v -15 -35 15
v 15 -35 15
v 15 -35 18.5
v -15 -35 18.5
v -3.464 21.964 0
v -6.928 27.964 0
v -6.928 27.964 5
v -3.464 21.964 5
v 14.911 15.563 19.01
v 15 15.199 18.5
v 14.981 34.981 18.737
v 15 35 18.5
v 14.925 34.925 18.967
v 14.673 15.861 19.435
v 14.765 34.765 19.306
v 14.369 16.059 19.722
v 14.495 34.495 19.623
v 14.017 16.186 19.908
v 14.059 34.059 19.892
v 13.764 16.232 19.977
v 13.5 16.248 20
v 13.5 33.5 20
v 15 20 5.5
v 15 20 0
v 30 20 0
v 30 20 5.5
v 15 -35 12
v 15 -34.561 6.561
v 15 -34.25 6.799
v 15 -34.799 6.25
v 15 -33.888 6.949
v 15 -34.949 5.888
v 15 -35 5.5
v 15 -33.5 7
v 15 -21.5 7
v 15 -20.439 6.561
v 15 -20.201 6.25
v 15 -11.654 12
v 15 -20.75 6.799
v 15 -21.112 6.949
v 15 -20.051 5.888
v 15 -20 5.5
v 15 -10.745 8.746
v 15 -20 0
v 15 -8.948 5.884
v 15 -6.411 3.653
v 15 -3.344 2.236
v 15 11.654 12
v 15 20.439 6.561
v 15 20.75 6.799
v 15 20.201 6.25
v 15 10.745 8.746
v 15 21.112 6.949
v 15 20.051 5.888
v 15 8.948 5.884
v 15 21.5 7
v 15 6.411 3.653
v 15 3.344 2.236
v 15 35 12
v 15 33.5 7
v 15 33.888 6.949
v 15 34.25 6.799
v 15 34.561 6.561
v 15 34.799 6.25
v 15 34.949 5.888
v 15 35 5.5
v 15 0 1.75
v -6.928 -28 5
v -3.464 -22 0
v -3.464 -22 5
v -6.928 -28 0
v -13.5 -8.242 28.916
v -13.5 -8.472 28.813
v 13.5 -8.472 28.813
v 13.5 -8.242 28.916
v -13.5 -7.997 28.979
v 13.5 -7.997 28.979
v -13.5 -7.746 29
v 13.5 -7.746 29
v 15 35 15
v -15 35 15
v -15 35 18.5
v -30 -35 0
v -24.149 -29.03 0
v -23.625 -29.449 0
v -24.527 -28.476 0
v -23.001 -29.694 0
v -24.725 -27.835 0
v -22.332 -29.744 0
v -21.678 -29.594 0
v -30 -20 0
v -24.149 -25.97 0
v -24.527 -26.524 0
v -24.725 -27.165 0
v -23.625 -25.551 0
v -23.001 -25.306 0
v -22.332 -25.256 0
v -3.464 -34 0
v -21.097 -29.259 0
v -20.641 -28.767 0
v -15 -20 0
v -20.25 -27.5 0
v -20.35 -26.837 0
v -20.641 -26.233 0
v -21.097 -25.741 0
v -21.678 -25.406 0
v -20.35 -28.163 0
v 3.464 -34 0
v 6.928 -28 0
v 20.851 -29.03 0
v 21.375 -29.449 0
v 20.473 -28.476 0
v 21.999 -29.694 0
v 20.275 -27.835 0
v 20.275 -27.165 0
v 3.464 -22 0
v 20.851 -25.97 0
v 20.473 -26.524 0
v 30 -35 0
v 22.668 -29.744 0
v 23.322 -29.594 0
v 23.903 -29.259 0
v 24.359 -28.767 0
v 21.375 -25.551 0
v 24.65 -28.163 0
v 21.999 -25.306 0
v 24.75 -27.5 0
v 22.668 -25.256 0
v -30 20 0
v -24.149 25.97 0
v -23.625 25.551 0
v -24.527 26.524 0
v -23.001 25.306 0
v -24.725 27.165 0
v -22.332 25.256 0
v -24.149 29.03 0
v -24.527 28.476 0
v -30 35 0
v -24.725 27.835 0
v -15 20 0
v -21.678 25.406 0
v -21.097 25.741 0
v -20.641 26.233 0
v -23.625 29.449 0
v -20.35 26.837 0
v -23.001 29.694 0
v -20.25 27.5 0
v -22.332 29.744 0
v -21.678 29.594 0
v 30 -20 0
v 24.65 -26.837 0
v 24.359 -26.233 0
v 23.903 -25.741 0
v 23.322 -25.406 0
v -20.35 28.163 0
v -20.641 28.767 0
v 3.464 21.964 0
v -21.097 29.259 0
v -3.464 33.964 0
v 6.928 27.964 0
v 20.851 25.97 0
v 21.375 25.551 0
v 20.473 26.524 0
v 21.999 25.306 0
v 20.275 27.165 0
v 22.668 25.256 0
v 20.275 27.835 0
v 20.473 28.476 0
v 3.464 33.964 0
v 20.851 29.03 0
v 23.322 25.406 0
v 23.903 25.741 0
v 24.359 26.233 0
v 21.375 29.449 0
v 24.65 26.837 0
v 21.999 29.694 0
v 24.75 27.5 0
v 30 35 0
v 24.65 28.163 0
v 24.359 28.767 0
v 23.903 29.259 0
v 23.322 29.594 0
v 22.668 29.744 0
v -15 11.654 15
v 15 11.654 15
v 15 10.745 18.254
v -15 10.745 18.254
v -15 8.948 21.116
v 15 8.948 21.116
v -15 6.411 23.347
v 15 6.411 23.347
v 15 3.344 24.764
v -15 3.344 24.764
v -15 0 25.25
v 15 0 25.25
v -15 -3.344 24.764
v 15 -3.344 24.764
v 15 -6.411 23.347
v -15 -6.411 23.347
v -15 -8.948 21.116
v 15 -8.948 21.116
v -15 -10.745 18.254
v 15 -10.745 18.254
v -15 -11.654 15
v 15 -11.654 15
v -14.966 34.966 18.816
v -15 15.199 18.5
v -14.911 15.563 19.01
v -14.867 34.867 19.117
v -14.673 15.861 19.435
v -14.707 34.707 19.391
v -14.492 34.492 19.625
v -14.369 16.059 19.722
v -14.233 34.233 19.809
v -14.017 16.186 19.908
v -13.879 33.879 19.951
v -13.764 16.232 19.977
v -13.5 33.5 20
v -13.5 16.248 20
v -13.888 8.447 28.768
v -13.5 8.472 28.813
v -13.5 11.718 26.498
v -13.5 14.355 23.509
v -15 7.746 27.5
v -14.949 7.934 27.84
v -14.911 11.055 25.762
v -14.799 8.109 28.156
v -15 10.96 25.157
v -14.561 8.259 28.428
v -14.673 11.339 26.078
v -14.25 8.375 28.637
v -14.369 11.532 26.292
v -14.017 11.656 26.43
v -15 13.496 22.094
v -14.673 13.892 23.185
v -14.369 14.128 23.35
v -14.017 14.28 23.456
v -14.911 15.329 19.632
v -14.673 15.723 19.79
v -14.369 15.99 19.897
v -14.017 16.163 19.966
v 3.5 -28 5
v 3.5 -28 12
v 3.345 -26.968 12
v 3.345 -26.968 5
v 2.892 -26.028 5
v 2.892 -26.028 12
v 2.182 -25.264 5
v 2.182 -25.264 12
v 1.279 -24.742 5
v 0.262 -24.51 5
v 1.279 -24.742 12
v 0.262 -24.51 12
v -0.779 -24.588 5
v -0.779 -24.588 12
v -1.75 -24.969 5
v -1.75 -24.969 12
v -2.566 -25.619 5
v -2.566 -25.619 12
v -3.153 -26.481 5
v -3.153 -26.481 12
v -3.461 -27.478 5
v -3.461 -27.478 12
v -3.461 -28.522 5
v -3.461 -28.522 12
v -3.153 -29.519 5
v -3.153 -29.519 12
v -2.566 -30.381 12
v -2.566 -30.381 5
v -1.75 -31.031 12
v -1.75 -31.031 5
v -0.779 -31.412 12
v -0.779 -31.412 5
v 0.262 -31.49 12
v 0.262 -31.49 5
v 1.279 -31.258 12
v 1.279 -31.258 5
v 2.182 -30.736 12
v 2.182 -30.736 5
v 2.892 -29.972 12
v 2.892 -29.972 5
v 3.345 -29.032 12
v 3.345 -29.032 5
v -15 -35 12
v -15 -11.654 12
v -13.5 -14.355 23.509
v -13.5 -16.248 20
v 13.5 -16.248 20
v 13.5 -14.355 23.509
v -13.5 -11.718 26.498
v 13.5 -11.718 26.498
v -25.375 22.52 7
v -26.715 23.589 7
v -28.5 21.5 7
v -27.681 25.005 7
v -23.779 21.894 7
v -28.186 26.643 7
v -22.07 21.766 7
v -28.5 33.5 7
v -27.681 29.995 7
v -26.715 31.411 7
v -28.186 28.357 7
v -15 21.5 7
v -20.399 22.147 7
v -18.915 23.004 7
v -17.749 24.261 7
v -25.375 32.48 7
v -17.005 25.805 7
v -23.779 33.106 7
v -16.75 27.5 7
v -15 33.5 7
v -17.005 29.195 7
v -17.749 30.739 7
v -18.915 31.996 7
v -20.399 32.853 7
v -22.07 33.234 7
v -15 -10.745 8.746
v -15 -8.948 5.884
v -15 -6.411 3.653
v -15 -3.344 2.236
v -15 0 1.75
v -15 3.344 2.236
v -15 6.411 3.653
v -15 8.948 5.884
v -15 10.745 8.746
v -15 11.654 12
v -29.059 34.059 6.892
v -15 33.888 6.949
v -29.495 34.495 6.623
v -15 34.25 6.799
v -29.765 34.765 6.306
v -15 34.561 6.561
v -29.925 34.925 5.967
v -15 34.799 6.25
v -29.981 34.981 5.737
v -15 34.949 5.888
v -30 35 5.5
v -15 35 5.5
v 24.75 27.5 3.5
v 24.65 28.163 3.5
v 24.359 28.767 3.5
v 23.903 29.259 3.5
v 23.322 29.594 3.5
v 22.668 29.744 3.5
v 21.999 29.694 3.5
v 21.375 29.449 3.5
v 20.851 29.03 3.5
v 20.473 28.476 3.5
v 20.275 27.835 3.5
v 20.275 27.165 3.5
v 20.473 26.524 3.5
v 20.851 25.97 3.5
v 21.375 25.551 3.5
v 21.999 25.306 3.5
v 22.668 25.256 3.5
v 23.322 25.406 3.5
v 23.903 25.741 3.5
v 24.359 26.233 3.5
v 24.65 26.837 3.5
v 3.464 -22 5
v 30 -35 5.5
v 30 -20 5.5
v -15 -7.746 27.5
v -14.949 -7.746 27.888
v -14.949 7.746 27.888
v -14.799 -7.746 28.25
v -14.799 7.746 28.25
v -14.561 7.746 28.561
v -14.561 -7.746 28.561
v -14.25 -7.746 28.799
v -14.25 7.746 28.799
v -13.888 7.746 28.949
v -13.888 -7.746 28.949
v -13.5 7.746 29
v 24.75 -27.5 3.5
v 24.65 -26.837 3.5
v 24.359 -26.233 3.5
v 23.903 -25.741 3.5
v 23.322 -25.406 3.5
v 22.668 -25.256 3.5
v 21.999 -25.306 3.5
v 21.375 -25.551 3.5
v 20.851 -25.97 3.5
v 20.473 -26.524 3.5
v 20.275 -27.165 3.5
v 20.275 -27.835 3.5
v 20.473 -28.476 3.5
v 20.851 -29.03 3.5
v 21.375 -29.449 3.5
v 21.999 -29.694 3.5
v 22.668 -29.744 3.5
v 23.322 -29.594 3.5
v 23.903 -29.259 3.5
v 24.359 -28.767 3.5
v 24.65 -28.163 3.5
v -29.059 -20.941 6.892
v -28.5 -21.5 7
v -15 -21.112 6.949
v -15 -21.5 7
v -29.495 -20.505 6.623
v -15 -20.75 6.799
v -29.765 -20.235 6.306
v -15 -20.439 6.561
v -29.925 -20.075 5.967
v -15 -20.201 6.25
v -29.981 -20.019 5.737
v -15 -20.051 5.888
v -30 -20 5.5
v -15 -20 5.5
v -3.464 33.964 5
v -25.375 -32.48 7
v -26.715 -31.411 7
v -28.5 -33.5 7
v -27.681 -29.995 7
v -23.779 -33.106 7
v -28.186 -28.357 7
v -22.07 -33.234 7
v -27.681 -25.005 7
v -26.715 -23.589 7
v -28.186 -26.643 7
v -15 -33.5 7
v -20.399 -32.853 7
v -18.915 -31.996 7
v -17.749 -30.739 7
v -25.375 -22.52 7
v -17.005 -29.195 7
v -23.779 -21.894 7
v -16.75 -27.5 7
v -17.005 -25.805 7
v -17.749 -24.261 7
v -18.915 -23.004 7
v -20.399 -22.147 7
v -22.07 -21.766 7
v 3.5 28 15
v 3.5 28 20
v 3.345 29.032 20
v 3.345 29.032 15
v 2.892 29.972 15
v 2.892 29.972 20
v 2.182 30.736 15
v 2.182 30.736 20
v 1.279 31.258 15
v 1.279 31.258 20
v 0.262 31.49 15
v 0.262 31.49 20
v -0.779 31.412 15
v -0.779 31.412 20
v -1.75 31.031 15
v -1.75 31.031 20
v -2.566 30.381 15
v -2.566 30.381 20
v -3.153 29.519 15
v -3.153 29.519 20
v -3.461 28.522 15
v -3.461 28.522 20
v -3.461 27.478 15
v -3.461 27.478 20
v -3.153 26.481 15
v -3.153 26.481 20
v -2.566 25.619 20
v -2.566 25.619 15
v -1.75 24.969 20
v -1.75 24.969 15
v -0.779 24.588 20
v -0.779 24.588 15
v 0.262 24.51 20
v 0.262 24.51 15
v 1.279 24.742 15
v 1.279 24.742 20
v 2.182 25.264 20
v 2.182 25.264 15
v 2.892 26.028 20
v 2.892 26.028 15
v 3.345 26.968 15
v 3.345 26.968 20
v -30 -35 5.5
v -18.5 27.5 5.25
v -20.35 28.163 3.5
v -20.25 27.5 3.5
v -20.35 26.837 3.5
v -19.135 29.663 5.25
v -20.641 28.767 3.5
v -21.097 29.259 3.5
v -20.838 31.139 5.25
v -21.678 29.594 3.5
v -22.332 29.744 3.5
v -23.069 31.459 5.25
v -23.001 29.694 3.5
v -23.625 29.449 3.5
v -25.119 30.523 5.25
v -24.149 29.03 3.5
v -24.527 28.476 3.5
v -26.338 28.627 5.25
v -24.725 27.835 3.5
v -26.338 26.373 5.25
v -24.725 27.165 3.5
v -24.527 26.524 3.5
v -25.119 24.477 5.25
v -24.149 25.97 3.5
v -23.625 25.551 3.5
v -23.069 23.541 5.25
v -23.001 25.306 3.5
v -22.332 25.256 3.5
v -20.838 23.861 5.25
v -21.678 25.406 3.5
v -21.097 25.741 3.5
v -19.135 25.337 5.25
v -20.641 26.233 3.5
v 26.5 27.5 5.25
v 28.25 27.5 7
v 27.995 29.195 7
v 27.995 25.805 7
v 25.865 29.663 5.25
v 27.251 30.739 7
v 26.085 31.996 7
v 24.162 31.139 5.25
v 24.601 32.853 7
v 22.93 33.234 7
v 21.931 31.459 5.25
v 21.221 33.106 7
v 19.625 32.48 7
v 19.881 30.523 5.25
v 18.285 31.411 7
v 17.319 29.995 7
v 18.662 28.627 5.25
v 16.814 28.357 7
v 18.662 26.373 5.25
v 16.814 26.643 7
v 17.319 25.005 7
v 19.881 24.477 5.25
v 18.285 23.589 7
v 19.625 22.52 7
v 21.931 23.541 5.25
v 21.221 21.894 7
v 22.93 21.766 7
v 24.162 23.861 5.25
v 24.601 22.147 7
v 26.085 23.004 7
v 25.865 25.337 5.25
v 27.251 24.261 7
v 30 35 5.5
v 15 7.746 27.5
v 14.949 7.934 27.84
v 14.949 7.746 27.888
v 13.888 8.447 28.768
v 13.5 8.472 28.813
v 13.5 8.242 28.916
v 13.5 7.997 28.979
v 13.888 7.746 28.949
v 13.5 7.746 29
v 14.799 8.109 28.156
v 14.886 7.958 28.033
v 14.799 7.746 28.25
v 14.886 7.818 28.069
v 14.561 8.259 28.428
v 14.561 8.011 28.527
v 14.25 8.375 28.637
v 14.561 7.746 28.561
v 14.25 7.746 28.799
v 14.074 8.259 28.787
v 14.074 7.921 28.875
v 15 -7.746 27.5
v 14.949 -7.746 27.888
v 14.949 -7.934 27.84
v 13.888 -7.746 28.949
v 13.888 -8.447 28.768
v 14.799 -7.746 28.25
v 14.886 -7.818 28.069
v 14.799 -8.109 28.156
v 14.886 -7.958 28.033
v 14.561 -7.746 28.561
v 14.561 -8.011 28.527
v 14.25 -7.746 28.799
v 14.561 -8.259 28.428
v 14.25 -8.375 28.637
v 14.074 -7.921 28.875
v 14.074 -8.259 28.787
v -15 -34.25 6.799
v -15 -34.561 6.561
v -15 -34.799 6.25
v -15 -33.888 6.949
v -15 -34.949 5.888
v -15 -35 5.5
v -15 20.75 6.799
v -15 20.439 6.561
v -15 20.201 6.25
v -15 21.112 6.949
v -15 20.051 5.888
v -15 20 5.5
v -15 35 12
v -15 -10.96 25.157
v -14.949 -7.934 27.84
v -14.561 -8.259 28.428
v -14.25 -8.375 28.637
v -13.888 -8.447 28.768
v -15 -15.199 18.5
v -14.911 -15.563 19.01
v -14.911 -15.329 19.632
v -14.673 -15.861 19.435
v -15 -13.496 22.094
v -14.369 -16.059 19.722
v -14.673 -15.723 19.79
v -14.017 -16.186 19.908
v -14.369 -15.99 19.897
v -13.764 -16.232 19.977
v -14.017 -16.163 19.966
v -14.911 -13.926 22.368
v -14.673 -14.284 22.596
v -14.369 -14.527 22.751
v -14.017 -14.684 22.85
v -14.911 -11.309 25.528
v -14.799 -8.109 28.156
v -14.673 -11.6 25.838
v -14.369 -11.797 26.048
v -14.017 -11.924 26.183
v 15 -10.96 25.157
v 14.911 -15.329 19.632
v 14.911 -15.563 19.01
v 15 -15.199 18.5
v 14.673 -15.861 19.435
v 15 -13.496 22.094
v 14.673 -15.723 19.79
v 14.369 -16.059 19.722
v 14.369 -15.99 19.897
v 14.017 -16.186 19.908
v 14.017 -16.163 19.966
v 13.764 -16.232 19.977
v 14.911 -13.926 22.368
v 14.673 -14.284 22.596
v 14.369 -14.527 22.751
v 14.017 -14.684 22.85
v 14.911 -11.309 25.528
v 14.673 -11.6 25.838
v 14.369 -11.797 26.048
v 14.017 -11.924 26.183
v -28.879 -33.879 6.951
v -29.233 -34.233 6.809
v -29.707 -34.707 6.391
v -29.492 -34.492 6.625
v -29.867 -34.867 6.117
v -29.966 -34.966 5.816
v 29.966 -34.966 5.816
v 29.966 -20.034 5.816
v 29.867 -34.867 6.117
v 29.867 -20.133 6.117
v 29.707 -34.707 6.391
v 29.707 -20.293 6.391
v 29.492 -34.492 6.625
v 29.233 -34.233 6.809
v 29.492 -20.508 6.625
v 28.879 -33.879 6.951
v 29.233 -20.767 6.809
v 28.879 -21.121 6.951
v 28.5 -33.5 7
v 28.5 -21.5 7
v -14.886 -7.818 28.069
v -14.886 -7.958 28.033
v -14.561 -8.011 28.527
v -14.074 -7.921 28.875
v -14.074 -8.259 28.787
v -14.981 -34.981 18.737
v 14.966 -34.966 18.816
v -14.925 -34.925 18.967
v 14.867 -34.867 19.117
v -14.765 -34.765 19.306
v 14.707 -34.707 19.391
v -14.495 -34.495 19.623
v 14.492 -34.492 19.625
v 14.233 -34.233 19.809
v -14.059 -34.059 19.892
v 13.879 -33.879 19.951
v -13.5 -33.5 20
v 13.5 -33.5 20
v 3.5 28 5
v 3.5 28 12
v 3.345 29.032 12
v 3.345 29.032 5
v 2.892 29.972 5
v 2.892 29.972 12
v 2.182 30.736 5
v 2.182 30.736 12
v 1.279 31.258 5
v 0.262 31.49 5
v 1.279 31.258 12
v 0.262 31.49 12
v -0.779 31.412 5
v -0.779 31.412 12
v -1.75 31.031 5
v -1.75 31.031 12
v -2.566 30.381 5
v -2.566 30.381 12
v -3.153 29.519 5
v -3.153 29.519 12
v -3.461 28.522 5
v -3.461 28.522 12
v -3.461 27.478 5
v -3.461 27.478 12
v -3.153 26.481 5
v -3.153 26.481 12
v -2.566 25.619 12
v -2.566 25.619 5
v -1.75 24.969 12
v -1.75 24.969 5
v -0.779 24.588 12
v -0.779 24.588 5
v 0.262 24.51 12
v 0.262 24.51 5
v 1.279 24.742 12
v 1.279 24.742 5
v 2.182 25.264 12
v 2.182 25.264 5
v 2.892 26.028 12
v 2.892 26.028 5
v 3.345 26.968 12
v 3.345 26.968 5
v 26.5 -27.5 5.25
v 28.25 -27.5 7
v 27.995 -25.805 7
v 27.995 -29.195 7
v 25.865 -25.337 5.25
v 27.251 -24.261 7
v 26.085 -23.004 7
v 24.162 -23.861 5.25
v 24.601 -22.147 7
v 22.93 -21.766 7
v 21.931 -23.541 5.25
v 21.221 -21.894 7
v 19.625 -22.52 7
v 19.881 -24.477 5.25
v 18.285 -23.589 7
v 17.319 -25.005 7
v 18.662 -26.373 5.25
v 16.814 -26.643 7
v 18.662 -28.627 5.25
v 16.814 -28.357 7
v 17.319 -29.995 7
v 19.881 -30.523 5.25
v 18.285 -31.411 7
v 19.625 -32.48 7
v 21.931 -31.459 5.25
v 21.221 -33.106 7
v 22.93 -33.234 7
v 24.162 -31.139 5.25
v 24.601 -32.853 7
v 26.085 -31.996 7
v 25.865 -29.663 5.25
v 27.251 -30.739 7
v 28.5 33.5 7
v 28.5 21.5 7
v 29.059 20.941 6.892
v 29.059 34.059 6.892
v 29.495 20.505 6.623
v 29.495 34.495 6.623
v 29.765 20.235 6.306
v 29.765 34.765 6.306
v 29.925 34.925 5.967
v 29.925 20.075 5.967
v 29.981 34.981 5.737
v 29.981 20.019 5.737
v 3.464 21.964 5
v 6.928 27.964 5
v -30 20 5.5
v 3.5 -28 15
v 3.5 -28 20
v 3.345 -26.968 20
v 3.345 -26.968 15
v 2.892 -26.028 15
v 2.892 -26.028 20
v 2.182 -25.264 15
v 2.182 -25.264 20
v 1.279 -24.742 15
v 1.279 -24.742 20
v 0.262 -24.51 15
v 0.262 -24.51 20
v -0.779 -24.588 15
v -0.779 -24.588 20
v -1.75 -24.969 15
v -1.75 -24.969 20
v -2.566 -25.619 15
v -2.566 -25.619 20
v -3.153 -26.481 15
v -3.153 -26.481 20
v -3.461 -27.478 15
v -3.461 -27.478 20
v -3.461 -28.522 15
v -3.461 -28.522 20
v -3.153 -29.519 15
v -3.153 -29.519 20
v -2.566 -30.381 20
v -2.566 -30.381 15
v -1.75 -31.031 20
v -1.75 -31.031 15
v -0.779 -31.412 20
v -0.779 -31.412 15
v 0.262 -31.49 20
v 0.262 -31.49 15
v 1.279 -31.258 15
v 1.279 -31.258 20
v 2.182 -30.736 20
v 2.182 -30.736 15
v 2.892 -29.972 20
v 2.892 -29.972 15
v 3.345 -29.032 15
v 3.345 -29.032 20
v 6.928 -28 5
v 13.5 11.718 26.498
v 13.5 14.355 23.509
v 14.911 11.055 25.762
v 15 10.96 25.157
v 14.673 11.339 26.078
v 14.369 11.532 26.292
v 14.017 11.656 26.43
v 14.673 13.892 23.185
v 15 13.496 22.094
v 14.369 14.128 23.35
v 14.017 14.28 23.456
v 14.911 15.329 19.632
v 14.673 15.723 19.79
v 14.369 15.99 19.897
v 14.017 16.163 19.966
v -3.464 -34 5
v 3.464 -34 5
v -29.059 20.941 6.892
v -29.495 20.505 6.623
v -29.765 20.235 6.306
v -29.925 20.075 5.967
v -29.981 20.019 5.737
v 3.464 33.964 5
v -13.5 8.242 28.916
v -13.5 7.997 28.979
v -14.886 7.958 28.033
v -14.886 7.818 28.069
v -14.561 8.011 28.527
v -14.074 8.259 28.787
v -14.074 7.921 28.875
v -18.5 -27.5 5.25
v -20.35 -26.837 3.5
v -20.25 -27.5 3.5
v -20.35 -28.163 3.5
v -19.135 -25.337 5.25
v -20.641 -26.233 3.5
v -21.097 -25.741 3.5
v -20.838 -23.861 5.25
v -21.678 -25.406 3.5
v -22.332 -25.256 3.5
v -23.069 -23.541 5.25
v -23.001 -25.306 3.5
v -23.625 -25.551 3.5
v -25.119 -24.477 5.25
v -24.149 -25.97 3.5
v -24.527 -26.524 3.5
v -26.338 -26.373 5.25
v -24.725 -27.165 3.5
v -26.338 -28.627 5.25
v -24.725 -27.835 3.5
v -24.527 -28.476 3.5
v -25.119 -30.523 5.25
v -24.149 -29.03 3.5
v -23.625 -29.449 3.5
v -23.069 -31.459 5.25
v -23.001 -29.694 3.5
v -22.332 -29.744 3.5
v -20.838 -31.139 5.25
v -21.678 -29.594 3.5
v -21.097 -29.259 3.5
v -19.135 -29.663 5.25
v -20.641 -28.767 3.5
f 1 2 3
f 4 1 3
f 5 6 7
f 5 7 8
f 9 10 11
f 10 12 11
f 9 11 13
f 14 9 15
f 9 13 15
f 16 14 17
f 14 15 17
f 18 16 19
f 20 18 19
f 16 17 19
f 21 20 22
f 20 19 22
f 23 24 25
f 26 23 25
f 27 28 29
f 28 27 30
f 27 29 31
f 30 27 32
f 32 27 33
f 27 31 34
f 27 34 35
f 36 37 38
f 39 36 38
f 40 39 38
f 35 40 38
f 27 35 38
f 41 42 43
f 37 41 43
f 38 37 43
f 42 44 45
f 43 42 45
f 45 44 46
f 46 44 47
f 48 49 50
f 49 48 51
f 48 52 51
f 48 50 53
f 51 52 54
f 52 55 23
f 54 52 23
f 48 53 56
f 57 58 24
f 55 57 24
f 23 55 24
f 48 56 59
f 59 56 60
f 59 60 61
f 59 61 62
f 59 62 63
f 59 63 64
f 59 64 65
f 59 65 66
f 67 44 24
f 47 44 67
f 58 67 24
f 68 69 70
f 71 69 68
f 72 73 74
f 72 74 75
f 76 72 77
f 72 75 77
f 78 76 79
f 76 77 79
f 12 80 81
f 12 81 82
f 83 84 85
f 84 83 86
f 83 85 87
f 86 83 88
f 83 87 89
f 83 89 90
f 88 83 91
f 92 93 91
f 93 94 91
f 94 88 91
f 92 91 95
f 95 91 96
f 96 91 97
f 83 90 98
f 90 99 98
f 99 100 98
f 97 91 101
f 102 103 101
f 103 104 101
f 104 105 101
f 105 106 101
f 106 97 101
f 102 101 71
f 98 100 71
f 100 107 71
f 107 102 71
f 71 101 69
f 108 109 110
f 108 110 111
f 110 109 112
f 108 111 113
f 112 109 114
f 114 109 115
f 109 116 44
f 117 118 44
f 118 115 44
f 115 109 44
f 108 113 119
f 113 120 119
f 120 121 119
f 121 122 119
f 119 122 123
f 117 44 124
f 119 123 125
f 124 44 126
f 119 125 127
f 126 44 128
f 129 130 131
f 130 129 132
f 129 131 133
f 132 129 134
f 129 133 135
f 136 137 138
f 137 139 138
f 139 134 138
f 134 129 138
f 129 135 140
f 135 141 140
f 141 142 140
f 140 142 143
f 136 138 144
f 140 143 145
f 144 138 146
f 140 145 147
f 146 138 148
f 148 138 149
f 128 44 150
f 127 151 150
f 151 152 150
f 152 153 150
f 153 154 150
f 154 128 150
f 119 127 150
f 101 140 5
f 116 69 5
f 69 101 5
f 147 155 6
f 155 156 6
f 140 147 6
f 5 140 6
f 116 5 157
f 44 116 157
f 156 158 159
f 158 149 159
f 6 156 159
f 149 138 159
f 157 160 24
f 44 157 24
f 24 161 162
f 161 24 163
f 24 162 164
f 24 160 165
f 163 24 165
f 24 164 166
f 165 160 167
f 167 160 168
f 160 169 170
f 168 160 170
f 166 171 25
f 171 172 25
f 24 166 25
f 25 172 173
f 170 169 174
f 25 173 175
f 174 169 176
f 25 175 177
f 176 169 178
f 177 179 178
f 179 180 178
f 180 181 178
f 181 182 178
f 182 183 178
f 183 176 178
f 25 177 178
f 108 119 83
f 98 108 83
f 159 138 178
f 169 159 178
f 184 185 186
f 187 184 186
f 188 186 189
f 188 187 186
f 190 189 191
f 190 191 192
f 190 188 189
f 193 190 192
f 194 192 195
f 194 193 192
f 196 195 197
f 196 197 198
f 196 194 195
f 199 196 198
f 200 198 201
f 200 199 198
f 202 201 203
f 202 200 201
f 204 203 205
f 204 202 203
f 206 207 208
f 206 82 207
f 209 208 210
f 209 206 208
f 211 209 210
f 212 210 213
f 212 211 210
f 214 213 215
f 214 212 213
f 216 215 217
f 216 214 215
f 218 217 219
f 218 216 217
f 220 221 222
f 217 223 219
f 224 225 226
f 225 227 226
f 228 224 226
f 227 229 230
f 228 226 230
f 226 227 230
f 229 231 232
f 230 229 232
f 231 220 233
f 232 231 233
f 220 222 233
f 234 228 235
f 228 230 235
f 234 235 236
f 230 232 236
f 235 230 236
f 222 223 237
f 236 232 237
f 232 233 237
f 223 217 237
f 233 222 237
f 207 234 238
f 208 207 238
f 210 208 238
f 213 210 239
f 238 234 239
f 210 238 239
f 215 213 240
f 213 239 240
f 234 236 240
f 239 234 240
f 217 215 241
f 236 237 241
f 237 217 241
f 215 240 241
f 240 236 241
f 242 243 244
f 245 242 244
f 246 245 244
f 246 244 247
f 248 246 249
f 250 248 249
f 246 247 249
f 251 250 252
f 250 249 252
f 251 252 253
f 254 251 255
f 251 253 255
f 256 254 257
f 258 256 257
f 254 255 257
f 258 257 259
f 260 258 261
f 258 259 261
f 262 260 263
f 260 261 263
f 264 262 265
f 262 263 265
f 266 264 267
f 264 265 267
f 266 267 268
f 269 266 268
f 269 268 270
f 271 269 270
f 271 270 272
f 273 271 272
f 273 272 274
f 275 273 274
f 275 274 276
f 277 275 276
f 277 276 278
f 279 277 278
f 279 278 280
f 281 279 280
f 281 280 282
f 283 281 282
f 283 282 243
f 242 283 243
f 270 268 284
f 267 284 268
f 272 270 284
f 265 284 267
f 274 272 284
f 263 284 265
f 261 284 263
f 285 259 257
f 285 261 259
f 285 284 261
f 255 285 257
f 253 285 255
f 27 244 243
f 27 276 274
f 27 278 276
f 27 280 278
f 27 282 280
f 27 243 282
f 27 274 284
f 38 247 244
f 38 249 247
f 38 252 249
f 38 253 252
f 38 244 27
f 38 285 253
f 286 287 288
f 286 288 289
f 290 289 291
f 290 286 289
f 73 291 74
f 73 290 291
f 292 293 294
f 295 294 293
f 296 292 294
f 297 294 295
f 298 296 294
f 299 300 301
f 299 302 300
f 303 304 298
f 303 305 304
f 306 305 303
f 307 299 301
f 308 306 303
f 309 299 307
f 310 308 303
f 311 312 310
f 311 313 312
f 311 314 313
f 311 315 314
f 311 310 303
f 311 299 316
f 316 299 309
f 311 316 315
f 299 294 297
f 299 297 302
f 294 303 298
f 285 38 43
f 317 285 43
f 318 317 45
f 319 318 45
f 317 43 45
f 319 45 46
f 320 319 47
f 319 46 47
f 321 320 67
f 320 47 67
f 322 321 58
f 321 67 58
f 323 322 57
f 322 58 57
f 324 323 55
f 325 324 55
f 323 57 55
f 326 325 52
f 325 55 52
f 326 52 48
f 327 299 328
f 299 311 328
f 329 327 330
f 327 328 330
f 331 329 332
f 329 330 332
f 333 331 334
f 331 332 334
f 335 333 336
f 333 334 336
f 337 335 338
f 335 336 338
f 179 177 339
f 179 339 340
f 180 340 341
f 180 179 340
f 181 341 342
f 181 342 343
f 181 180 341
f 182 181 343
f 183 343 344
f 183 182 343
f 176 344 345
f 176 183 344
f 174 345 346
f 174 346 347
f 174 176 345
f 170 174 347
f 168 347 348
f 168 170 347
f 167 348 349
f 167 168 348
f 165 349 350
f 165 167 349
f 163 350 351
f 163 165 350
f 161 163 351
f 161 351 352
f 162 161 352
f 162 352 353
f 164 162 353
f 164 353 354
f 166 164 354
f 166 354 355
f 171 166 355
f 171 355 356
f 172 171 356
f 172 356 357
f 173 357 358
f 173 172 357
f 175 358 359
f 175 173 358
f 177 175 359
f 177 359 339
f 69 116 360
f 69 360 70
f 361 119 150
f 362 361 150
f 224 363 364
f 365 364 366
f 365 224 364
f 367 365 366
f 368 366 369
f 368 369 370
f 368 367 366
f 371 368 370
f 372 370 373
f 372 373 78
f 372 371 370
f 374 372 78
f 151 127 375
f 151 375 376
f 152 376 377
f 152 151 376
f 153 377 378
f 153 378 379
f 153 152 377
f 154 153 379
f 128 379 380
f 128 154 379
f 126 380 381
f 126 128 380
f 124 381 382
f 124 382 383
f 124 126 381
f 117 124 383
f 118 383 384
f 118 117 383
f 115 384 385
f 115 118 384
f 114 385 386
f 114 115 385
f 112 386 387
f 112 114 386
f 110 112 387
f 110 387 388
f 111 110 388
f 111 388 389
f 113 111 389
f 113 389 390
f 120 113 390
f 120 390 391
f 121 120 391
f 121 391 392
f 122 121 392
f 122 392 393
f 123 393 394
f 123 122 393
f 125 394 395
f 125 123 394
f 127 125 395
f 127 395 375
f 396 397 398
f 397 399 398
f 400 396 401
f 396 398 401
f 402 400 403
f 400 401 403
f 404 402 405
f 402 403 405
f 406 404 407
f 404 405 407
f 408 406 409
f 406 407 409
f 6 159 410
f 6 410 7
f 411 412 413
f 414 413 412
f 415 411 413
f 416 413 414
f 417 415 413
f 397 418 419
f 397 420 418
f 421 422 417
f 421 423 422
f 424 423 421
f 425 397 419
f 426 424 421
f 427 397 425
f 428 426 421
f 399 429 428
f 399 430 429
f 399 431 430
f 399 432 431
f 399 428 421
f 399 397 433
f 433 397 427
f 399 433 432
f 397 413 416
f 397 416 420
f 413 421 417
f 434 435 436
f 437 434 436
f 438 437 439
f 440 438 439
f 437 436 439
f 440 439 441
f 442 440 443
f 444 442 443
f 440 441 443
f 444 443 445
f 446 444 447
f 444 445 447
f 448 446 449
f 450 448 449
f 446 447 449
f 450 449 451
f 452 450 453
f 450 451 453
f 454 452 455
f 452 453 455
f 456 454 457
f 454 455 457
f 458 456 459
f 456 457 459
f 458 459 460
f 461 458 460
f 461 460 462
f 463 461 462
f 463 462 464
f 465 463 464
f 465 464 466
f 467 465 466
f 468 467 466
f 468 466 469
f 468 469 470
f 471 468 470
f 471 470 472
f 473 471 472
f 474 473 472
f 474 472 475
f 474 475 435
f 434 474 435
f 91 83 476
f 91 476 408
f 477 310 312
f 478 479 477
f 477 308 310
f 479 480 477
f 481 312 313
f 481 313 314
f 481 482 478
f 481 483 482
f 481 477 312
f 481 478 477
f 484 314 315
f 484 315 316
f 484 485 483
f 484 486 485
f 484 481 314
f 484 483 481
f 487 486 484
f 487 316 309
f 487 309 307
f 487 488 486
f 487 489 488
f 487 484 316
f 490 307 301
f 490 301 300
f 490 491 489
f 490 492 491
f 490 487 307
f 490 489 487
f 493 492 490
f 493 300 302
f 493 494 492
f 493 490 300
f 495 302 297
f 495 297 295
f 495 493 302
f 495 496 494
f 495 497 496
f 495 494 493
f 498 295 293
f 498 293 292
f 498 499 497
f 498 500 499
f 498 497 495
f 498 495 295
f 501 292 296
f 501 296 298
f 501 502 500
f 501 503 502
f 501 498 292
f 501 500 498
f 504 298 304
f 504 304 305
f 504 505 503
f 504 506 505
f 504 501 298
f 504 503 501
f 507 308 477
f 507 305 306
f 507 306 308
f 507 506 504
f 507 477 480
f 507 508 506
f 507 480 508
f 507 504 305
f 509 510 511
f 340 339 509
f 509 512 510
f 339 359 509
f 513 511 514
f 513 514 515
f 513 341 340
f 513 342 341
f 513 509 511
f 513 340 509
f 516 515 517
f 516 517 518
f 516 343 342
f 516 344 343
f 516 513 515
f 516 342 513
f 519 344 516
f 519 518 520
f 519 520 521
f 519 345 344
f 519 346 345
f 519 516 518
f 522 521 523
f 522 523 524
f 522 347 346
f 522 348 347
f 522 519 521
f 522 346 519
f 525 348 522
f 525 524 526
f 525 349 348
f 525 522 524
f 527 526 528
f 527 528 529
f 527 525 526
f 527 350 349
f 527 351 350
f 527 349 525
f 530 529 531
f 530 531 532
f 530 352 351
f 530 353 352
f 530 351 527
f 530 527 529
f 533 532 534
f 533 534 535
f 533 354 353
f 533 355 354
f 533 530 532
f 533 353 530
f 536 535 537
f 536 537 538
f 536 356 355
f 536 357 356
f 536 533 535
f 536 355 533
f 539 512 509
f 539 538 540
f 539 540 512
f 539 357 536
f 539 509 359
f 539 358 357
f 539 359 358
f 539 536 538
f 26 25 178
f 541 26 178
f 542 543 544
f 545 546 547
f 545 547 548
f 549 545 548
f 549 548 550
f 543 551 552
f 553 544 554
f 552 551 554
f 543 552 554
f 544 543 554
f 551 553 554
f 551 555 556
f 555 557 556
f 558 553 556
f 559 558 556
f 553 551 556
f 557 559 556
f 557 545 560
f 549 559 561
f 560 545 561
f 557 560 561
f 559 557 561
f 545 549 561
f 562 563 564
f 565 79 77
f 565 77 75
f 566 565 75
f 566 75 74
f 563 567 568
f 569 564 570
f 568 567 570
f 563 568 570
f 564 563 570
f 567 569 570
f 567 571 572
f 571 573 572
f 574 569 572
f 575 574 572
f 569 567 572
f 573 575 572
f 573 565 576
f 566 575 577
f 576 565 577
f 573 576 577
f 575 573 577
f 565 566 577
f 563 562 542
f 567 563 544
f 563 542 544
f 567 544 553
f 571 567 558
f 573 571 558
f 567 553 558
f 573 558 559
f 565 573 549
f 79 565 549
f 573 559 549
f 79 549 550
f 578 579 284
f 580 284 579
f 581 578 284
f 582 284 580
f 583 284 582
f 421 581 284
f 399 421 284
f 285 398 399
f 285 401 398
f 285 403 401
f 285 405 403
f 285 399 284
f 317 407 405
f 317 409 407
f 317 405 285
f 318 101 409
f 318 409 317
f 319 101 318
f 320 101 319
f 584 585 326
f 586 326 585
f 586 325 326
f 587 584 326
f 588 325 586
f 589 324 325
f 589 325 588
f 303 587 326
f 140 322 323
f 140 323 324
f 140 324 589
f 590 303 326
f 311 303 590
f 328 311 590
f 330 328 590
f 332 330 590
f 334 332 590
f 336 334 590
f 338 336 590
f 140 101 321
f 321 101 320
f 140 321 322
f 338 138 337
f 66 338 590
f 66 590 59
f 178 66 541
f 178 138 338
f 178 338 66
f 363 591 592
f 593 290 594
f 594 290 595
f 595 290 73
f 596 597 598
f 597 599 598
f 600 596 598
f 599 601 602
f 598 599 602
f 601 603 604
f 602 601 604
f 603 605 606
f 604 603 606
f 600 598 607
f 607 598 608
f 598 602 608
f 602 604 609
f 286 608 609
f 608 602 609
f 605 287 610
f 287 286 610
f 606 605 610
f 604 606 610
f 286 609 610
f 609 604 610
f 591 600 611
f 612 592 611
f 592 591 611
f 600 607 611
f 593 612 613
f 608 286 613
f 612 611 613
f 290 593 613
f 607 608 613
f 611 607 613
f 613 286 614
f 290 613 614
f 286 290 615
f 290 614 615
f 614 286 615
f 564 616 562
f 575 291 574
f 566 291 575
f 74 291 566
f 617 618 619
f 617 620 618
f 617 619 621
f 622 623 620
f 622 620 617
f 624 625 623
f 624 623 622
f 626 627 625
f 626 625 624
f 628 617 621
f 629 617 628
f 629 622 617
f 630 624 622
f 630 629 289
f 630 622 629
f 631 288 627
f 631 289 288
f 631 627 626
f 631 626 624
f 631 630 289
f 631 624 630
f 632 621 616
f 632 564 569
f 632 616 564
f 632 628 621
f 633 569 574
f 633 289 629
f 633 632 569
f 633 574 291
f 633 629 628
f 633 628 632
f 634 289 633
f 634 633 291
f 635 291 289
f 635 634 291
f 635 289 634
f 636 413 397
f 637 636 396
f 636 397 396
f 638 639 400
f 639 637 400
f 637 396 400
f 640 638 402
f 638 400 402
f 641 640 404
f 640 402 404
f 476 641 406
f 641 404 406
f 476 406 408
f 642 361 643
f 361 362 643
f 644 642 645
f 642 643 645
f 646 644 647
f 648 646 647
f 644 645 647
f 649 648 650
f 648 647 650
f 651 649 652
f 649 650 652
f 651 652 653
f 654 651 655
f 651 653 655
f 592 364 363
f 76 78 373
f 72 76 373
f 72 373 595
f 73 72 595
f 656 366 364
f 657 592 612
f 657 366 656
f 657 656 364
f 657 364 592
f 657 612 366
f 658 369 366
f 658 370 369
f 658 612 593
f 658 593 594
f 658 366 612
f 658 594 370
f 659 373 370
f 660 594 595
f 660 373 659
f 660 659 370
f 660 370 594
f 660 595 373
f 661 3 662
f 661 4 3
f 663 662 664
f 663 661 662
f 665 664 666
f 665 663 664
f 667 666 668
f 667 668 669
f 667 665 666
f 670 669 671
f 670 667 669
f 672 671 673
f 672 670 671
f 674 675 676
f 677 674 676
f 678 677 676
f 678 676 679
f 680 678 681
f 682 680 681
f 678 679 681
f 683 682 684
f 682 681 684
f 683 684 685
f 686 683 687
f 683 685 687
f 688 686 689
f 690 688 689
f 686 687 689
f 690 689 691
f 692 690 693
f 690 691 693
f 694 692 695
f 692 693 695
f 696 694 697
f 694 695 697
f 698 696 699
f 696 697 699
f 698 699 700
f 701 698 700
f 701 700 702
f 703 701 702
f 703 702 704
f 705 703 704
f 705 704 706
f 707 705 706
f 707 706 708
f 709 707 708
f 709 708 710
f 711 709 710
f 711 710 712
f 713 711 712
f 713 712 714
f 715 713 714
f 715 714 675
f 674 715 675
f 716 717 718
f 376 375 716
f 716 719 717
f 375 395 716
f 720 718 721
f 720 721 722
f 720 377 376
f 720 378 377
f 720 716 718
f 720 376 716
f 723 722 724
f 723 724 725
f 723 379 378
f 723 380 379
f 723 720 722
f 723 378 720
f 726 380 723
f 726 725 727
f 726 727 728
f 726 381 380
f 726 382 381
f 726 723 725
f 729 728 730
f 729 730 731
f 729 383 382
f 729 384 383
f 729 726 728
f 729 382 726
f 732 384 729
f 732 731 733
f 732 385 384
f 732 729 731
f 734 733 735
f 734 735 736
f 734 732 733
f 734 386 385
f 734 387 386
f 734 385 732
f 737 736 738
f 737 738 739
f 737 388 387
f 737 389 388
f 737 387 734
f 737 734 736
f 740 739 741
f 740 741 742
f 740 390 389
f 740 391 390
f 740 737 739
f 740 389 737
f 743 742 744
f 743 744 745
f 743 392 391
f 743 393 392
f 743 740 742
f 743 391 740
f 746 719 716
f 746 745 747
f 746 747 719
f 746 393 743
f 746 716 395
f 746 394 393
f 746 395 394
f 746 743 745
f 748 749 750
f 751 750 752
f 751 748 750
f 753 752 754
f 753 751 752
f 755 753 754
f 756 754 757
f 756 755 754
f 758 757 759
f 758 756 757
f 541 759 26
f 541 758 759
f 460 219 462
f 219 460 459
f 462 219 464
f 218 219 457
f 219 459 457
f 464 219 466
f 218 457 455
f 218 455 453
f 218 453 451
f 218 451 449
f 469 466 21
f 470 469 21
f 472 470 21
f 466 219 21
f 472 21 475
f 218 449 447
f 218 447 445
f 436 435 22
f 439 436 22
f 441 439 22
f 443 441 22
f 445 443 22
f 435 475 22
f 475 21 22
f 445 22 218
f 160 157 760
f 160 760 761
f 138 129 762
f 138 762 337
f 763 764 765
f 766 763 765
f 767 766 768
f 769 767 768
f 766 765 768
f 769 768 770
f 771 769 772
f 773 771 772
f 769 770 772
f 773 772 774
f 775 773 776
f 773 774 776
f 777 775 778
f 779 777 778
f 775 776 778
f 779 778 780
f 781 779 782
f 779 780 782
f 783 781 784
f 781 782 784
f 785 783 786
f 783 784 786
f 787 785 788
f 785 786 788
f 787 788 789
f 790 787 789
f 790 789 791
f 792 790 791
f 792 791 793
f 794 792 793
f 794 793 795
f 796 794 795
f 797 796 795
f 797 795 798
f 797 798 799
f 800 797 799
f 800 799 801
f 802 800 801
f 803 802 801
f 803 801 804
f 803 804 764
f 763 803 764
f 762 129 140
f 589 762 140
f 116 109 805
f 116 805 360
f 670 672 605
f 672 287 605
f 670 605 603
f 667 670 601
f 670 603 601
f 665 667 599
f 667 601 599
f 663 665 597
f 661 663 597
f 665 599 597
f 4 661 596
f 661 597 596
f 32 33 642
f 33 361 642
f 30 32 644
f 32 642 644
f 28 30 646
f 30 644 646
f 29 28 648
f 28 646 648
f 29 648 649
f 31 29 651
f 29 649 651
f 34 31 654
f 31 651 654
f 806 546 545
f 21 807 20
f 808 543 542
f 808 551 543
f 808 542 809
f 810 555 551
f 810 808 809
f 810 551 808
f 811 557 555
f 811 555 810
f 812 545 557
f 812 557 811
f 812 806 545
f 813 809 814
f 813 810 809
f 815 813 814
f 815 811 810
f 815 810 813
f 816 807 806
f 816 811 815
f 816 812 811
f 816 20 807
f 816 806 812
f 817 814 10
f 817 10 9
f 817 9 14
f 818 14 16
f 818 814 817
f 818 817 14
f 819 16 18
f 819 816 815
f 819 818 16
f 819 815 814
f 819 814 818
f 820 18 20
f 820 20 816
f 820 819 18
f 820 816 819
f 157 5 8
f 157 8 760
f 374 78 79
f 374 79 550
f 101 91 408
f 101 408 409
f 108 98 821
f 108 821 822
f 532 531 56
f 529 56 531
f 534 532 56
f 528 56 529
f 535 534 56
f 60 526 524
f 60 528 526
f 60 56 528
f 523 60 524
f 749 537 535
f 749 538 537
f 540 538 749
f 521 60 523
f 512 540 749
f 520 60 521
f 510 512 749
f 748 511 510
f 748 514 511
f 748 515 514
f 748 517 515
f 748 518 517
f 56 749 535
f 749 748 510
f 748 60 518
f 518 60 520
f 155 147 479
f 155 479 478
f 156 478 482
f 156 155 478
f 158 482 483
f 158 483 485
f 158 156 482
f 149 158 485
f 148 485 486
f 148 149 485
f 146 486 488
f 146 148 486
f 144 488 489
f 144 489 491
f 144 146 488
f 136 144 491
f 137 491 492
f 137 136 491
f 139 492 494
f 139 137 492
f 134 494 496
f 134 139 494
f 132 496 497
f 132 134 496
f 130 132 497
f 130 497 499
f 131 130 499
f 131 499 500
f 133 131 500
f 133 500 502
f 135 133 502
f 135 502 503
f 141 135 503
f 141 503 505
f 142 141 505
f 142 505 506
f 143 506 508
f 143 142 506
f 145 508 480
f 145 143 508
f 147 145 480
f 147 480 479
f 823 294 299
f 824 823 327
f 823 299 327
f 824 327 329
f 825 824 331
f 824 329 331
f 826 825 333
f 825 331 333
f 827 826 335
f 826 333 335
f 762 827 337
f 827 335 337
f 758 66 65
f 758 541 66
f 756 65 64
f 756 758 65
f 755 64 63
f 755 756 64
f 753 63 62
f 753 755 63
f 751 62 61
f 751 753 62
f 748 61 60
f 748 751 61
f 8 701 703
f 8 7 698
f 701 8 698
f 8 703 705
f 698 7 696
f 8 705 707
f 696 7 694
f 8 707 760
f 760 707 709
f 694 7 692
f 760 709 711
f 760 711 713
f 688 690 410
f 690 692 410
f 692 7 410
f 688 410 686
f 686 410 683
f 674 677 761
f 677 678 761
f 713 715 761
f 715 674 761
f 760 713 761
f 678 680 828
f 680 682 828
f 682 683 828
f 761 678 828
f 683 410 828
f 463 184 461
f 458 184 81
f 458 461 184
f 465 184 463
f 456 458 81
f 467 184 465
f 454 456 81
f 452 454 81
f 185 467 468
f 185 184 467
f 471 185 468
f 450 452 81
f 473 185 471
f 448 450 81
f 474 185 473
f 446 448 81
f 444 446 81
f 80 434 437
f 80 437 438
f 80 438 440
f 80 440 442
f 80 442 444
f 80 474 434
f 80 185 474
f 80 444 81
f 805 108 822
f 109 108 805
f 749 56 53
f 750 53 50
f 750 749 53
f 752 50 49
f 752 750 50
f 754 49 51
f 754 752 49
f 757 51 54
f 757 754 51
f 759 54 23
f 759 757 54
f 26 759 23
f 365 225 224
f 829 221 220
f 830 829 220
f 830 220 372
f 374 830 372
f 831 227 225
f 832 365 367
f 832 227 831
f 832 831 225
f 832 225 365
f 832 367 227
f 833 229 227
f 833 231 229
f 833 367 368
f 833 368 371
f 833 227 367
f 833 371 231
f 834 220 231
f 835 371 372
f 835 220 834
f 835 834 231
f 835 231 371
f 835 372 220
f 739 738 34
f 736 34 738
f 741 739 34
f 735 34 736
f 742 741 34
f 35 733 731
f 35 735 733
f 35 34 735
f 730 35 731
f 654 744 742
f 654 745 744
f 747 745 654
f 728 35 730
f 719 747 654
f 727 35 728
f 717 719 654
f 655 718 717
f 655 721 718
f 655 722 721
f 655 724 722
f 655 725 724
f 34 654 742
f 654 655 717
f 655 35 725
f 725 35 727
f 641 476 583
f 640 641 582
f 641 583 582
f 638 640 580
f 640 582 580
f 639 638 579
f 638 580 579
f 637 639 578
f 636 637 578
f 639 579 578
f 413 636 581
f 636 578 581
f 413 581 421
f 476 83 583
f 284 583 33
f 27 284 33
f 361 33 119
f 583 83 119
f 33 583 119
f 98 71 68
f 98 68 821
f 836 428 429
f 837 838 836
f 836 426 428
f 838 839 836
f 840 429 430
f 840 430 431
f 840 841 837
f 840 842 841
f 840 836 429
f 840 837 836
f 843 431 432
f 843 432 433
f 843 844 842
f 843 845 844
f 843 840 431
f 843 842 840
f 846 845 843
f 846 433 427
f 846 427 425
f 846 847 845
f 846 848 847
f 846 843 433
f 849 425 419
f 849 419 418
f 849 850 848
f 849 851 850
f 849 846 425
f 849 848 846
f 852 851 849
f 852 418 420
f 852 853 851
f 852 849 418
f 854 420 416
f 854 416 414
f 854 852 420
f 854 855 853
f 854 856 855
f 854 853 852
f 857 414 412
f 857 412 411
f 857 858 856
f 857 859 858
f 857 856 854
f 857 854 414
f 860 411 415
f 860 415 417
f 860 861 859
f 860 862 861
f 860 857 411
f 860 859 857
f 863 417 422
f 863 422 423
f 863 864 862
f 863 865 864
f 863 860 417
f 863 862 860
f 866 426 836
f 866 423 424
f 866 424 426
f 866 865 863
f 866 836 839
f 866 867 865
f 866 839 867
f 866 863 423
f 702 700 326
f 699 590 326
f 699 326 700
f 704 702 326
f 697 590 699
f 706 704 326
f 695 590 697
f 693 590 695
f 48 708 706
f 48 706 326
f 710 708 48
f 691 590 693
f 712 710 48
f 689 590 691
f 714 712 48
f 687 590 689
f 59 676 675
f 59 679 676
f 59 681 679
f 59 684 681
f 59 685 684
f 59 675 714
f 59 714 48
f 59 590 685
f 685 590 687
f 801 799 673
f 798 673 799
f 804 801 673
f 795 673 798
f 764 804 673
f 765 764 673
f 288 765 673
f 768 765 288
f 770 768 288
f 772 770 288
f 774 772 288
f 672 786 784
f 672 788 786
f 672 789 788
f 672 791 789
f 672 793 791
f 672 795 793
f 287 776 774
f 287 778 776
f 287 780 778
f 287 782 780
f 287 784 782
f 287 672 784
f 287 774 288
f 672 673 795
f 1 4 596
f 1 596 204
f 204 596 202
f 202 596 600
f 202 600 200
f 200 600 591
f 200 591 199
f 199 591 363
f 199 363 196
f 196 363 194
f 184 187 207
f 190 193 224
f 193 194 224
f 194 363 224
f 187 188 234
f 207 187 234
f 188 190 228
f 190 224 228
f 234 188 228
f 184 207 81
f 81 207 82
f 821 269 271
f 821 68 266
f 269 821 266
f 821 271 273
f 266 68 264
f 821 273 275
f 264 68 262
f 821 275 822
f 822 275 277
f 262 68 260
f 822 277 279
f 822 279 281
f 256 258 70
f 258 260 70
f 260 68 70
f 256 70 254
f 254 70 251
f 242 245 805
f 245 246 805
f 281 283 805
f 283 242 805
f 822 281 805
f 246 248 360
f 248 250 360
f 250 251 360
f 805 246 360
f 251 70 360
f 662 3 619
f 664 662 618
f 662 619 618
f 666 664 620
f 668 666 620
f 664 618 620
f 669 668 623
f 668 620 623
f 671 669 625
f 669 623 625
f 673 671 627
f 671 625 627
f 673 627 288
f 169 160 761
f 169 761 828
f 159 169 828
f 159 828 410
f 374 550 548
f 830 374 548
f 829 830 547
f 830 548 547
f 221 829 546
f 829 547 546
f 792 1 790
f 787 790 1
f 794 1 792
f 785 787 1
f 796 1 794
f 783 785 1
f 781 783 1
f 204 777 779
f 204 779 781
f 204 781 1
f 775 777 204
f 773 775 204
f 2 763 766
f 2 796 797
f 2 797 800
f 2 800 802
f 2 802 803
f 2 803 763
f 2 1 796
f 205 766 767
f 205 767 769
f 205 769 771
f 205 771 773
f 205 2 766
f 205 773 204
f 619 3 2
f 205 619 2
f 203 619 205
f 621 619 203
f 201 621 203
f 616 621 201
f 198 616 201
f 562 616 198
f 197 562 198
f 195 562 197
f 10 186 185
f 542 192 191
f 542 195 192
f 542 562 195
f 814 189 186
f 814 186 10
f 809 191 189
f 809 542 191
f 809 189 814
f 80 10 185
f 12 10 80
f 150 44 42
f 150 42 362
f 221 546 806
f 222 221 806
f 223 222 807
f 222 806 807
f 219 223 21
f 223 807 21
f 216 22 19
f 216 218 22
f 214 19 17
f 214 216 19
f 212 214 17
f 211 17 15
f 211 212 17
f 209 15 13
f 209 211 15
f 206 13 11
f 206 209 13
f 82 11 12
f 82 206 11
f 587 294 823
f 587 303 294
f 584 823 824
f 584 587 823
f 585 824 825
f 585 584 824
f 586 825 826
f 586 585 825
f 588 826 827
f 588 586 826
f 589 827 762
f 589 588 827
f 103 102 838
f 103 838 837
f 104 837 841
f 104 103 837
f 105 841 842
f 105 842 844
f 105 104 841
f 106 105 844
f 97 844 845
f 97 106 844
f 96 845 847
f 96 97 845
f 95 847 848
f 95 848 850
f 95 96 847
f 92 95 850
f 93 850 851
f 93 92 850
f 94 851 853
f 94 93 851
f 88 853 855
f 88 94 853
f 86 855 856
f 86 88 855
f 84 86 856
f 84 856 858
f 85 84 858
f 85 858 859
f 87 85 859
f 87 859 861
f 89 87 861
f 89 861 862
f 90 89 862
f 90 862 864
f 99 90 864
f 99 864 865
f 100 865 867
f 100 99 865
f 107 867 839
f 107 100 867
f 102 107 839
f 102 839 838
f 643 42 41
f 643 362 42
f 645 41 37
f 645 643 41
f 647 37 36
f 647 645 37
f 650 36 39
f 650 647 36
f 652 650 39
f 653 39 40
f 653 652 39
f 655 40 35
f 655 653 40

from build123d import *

# Parameters (mm, degrees)
F0_W      = 30
F0_H      = 70
F1_DEPTH  = 12
F2_W      = 70
F2_H      = 14
F3_DEPTH  = 15
F5_DEPTH  = 15
F7_DEPTH  = 15
F9_DEPTH  = 20.001
F11_DEPTH = 5
F12_W     = 15
F12_H     = 15
F12_R     = 2.25
F13_DEPTH = 7
F14_SIZE  = 3.5
F15_R     = 1.5
F15_2_R   = 1.5


with BuildPart() as f1:
    # F0 (on Top) → F1 (new body)
    with BuildSketch(Plane.XY):
        Rectangle(F0_W, F0_H)
    extrude(amount=F1_DEPTH)


with BuildPart() as f3:
    # F2 (on Right) → F3 (new body, symmetric)
    with BuildSketch(Plane.YZ):
        with Locations((0, 22)):
            Rectangle(F2_W, F2_H)
    extrude(amount=F3_DEPTH, both=True)


with BuildPart() as f5_tool:
    # F4 (on Right) → F5 (new body, symmetric)
    with BuildSketch(Plane.YZ):
        with BuildLine():
            ThreePointArc((11.75, 13.5), (0, 25.25), (-11.75, 13.5))
            Line((-11.75, 13.5), (0, 13.5))
            Line((0, 13.5), (0, 12))
            Line((0, 12), (-11.6538620208, 12))
            ThreePointArc((-11.6538620208, 12), (0.7515388398, 1.7740591264), (11.75, 13.5))
        make_face()
        with BuildLine():
            Line((0, 13.5), (-11.75, 13.5))
            ThreePointArc((-11.75, 13.5), (-11.7259408736, 12.7484611602), (-11.6538620208, 12))
            Line((-11.6538620208, 12), (0, 12))
            Line((0, 12), (0, 13.5))
        make_face()
    extrude(amount=F5_DEPTH, both=True)


with BuildPart() as f1_1:
    add(f1.part)

    # F5: cut by f5_tool
    add(f5_tool.part, mode=Mode.SUBTRACT)


with BuildPart() as f3_1:
    add(f3.part)

    # F5: cut by f5_tool
    add(f5_tool.part, mode=Mode.SUBTRACT)

    # F6 (on Right) → F7 (cut, symmetric)
    with BuildSketch(Plane.YZ):
        with BuildLine():
            ThreePointArc((-16.2480768093, 20), (-12.9903810568, 25.2260393996), (-8.1240384046, 29))
            Line((-8.1240384046, 29), (-35, 29))
            Line((-35, 29), (-35, 20))
            Line((-35, 20), (-16.2480768093, 20))
        make_face()
        with BuildLine():
            Line((35, 20), (35, 29))
            Line((35, 29), (8.1240384046, 29))
            ThreePointArc((8.1240384046, 29), (12.9903810568, 25.2260393996), (16.2480768093, 20))
            Line((16.2480768093, 20), (35, 20))
        make_face()
    extrude(amount=F7_DEPTH, both=True, mode=Mode.SUBTRACT)


with BuildPart() as f9_tool:
    # F8 (on face) → F9 (new body, through all)
    with BuildSketch(Plane.XY.offset(20)):
        with BuildLine():
            Line((3.5, 28), (-3.5, 28))
            ThreePointArc((-3.5, 28), (0, 24.5), (3.5, 28))
        make_face()
        with BuildLine():
            Line((3.5, -28), (-3.5, -28))
            ThreePointArc((-3.5, -28), (0, -31.5), (3.5, -28))
        make_face()
        with BuildLine():
            ThreePointArc((3.5, -28), (0, -24.5), (-3.5, -28))
            Line((-3.5, -28), (3.5, -28))
        make_face()
        with BuildLine():
            ThreePointArc((3.5, 28), (0, 31.5), (-3.5, 28))
            Line((-3.5, 28), (3.5, 28))
        make_face()
    extrude(amount=-F9_DEPTH)


with BuildPart() as f1_2:
    add(f1_1.part)

    # F9: cut by f9_tool
    add(f9_tool.part, mode=Mode.SUBTRACT)

    # F10 (on Top) → F11 (cut)
    with BuildSketch(Plane.XY):
        Polygon((3.4641016151, -22), (-3.4641016151, -22), (-6.9282032303, -28), (-3.4641016151, -34), (3.4641016151, -34), (6.9282032303, -28), align=None)
        Polygon((3.4641016151, 21.9635427939), (6.9282032303, 27.9635427939), (3.4641016151, 33.9635427939), (-3.4641016151, 33.9635427939), (-6.9282032303, 27.9635427939), (-3.4641016151, 21.9635427939), align=None)
    extrude(amount=F11_DEPTH, mode=Mode.SUBTRACT)

    # F12 (on Top) → F13 (join)
    with BuildSketch(Plane.XY):
        with Locations((-22.5, 27.5)):
            Rectangle(F12_W, F12_H)
        with Locations((-22.5, 27.5)):
            Circle(F12_R, mode=Mode.SUBTRACT)
        with Locations((-22.5, -27.5)):
            Rectangle(F12_W, F12_H)
        with Locations((-22.5, -27.5)):
            Circle(F12_R, mode=Mode.SUBTRACT)
        with Locations((22.5, -27.5)):
            Rectangle(F12_W, F12_H)
        with Locations((22.5, -27.5)):
            Circle(F12_R, mode=Mode.SUBTRACT)
        with Locations((22.5, 27.5)):
            Rectangle(F12_W, F12_H)
        with Locations((22.5, 27.5)):
            Circle(F12_R, mode=Mode.SUBTRACT)
    extrude(amount=F13_DEPTH)

    # F14
    f14_edges = [f1_2.edges().sort_by_distance(p)[0] for p in [
        (-24.75, 27.5, 7),
        (20.25, 27.5, 7),
        (20.25, -27.5, 7),
        (-24.75, -27.5, 7),
    ]]
    chamfer(f14_edges, length=F14_SIZE)

    # F15#2
    f15_2_edges = [f1_2.edges().sort_by_distance(p)[0] for p in [
        (-22.5, -35, 7),
        (-30, -27.5, 7),
        (-22.5, -20, 7),
        (22.5, -35, 7),
        (30, -27.5, 7),
        (22.5, -20, 7),
        (22.5, 20, 7),
        (30, 27.5, 7),
        (22.5, 35, 7),
        (-22.5, 35, 7),
        (-30, 27.5, 7),
        (-22.5, 20, 7),
    ]]
    fillet(f15_2_edges, radius=F15_2_R)


with BuildPart() as f3_2:
    add(f3_1.part)

    # F9: cut by f9_tool
    add(f9_tool.part, mode=Mode.SUBTRACT)

    # F15
    f15_edges = [f3_2.edges().sort_by_distance(p)[0] for p in [
        (-15, 25.624038, 20),
        (0, 35, 20),
        (15, 25.624038, 20),
        (15, 12.990381, 25.226039),
        (-15, 12.990381, 25.226039),
        (-15, 0, 29),
        (15, 0, 29),
        (15, -12.990381, 25.226039),
        (-15, -12.990381, 25.226039),
        (-15, -25.624038, 20),
        (0, -35, 20),
        (15, -25.624038, 20),
        (0, -8.124038, 29),
        (0, 8.124038, 29),
    ]]
    fillet(f15_edges, radius=F15_R)


solid = Compound([f1_2.part, f3_2.part])
